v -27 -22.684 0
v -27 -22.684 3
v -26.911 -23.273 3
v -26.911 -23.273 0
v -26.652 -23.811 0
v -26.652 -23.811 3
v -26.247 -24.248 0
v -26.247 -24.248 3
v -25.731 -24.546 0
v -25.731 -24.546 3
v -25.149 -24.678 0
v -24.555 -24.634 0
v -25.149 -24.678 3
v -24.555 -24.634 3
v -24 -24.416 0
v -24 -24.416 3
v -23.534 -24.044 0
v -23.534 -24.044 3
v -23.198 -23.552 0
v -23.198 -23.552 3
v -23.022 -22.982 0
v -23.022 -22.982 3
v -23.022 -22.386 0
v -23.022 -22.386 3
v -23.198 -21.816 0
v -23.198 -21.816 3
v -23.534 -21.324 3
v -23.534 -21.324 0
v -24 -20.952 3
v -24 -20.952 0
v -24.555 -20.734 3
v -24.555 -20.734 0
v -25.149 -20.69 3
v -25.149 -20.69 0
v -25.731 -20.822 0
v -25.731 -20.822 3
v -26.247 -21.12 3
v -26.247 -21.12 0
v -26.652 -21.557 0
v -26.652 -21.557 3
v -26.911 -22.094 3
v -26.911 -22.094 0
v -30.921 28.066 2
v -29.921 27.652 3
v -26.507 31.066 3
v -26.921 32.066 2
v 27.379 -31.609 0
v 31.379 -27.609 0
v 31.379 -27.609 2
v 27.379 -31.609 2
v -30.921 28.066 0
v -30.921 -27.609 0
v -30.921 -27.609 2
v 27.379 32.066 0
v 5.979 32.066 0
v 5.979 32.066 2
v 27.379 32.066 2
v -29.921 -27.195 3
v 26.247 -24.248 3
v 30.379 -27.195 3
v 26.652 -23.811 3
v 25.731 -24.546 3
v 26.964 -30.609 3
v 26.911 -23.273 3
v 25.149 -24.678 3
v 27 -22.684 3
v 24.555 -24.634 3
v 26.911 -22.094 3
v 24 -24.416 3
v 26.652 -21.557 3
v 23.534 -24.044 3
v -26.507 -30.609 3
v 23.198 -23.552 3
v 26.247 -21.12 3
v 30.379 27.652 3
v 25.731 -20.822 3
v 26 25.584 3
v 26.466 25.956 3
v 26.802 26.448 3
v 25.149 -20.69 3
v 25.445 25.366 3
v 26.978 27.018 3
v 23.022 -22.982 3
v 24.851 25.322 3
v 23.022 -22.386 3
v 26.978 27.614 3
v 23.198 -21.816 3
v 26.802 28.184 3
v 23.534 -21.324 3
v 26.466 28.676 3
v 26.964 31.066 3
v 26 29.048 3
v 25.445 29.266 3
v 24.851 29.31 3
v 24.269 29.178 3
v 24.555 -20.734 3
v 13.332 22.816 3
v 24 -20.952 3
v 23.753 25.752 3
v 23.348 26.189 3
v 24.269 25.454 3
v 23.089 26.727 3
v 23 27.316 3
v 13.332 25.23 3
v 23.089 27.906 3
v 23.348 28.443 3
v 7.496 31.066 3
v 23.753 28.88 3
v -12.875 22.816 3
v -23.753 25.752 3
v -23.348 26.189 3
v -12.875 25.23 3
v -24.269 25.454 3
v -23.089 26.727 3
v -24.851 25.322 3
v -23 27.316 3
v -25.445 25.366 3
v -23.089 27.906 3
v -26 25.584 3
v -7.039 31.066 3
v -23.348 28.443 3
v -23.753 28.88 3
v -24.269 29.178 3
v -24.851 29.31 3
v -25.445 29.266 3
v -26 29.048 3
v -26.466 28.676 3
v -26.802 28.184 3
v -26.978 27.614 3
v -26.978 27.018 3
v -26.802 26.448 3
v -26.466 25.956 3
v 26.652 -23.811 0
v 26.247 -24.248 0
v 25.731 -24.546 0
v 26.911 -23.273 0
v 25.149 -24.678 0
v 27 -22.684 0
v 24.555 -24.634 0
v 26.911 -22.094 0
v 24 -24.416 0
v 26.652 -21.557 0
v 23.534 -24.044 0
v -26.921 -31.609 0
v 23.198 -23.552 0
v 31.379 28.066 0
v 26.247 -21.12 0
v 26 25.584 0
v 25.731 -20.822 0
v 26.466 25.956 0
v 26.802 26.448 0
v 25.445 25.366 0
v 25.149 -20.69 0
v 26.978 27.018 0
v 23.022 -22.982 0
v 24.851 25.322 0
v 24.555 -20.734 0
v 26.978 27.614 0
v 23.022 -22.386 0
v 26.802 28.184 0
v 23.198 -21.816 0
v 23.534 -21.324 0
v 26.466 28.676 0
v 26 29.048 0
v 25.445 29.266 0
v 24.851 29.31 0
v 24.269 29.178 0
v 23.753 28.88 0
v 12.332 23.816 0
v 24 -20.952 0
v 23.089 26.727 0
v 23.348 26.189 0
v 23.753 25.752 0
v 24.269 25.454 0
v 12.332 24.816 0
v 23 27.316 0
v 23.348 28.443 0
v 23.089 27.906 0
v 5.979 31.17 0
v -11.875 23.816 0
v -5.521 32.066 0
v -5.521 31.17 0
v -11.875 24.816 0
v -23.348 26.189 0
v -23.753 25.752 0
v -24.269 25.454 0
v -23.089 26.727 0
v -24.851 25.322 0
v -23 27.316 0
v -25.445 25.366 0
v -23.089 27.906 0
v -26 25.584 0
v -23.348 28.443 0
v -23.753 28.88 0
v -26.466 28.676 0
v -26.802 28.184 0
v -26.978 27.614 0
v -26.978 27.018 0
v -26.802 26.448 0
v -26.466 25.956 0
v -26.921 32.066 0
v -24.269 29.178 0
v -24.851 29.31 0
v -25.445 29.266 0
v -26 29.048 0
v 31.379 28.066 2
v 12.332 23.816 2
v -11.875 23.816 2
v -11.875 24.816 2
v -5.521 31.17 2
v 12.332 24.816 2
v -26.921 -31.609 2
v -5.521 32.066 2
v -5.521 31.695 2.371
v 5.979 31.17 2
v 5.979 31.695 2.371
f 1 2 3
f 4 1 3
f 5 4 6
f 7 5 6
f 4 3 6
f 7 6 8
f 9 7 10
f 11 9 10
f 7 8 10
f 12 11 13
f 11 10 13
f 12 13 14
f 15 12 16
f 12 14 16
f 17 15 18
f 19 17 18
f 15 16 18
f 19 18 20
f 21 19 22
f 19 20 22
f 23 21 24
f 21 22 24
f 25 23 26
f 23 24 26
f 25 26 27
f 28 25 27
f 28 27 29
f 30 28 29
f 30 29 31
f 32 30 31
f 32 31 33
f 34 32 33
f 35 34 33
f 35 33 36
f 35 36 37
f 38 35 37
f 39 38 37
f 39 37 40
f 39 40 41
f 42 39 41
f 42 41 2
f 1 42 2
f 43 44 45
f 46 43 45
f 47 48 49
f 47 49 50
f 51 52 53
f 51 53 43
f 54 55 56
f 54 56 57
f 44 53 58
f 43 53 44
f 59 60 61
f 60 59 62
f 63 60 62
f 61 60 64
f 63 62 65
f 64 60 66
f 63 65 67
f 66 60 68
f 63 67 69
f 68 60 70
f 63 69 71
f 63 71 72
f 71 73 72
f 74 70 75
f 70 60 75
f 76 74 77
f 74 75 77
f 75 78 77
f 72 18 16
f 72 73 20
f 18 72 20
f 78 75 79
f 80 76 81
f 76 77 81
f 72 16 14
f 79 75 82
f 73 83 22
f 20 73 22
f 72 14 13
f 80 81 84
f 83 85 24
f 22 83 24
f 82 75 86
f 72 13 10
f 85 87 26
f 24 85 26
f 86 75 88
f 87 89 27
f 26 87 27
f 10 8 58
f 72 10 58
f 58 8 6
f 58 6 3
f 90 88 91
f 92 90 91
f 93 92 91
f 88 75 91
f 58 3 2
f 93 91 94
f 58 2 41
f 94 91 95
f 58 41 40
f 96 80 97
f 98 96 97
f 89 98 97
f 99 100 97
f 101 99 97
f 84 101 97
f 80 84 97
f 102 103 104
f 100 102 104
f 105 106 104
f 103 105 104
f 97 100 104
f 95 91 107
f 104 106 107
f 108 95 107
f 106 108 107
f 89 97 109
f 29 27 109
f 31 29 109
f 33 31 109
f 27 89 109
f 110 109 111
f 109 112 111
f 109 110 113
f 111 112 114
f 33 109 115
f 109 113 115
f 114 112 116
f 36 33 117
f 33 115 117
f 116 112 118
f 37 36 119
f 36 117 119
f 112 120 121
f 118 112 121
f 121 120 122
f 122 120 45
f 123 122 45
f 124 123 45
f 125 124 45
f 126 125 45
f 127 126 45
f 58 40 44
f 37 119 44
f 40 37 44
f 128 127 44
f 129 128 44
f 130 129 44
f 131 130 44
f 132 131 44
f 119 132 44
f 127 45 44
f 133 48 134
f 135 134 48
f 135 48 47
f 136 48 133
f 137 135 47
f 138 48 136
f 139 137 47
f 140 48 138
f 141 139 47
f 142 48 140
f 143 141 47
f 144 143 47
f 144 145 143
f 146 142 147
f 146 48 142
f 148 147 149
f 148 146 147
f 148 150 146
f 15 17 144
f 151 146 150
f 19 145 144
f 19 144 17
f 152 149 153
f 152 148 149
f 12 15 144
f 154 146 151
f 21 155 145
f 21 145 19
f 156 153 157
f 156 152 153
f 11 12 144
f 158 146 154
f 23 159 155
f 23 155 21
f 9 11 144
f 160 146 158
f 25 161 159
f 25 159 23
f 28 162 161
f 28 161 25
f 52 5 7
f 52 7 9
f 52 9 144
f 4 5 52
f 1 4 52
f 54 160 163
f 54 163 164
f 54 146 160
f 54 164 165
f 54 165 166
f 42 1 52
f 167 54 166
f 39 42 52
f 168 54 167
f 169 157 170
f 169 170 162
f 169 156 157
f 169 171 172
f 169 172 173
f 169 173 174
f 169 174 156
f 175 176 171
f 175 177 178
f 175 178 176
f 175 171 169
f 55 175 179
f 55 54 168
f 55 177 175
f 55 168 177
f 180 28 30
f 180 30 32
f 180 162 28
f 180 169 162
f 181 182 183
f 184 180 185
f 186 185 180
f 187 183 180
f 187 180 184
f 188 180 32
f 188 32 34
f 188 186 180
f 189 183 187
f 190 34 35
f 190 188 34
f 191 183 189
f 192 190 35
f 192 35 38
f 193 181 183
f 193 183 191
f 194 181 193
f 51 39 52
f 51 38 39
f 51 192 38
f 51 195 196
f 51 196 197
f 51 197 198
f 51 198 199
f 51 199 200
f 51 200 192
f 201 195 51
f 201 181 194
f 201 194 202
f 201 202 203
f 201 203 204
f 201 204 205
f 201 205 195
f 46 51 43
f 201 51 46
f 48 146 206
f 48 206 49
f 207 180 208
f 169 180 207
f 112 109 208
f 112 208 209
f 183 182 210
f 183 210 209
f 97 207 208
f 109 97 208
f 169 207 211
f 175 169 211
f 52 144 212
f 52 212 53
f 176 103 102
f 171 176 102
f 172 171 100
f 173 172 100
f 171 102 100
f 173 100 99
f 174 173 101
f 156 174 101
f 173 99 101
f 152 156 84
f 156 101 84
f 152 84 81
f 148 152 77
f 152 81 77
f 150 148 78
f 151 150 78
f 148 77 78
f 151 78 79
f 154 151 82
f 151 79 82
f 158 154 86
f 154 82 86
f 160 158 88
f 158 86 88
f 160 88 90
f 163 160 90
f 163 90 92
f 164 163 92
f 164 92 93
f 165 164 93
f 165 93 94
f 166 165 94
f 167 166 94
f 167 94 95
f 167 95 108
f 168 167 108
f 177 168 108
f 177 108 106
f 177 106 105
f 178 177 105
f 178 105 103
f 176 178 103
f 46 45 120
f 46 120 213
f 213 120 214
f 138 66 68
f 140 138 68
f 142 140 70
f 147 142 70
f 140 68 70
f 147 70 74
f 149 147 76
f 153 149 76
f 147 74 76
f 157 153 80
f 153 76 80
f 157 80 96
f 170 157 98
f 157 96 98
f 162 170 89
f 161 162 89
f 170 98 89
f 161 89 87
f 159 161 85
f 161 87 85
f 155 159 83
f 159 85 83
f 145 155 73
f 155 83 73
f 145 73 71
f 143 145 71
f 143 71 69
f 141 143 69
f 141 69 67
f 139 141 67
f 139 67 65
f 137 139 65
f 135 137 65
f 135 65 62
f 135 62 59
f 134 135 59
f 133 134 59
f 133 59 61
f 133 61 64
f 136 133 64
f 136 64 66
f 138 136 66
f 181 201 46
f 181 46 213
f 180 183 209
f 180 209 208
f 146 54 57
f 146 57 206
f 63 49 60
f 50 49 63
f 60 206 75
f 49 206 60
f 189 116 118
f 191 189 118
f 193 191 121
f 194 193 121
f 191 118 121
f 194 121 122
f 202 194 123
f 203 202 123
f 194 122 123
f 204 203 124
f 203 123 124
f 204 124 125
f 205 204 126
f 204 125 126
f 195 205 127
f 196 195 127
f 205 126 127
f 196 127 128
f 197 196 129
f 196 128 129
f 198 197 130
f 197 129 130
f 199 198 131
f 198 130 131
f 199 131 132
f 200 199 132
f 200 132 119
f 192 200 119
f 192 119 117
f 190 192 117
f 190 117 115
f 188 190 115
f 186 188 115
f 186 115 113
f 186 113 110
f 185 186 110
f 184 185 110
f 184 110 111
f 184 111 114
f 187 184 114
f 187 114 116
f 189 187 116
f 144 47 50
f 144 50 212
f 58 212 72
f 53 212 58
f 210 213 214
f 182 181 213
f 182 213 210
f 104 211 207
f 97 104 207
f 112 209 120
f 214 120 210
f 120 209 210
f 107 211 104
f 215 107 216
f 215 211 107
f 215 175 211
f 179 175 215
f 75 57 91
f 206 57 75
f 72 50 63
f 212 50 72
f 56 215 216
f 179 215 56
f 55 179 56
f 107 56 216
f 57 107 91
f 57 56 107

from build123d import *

# Parameters (mm, degrees)
BOSS_EXTRUDE1_DEPTH = 3
CUT_EXTRUDE4_DEPTH  = 10
CHAMFER1_SIZE       = 1
SKETCH4_R           = 2
CUT_EXTRUDE5_DEPTH  = 10


with BuildPart() as part:
    # Sketch3 → Boss-Extrude1 (new body)
    with BuildSketch(Plane.XY):
        Polygon((-26.921356186, 32.06604295), (27.378643814, 32.06604295), (31.378643814, 28.06604295), (31.378643814, -27.608755321), (27.378643814, -31.608755321), (-26.921356186, -31.608755321), (-30.921356186, -27.608755321), (-30.921356186, 28.06604295), align=None)
    extrude(amount=BOSS_EXTRUDE1_DEPTH)

    # Sketch2 → Cut-Extrude4 (cut)
    with BuildSketch(Plane.XY):
        Polygon((-11.874909576, 24.81604295), (-11.874909576, 23.81604295), (12.332197205, 23.81604295), (12.332197205, 24.81604295), (5.978643814, 31.16959634), (5.978643814, 32.31604295), (-5.521356186, 32.31604295), (-5.521356186, 31.16959634), align=None)
    extrude(amount=CUT_EXTRUDE4_DEPTH, mode=Mode.SUBTRACT)

    # Chamfer1
    chamfer1_edges = [part.edges().sort_by_distance(p)[0] for p in [
        (-16.221356186, 32.06604295, 3),
    ]]
    chamfer(chamfer1_edges, length=CHAMFER1_SIZE)
    chamfer1_2_edges = [part.edges().sort_by_distance(p)[0] for p in [
        (-29.421356186, 29.56604295, 3),
    ]]
    chamfer(chamfer1_2_edges, length=CHAMFER1_SIZE)
    chamfer1_3_edges = [part.edges().sort_by_distance(p)[0] for p in [
        (-30.921356186, -0.478462967, 3),
    ]]
    chamfer(chamfer1_3_edges, length=CHAMFER1_SIZE)
    chamfer1_4_edges = [part.edges().sort_by_distance(p)[0] for p in [
        (-28.421356186, -30.108755321, 3),
    ]]
    chamfer(chamfer1_4_edges, length=CHAMFER1_SIZE)
    chamfer1_5_edges = [part.edges().sort_by_distance(p)[0] for p in [
        (0.935750595, -31.608755321, 3),
    ]]
    chamfer(chamfer1_5_edges, length=CHAMFER1_SIZE)
    chamfer1_6_edges = [part.edges().sort_by_distance(p)[0] for p in [
        (29.878643814, -29.108755321, 3),
    ]]
    chamfer(chamfer1_6_edges, length=CHAMFER1_SIZE)
    chamfer1_7_edges = [part.edges().sort_by_distance(p)[0] for p in [
        (31.378643814, 0.935750595, 3),
    ]]
    chamfer(chamfer1_7_edges, length=CHAMFER1_SIZE)
    chamfer1_8_edges = [part.edges().sort_by_distance(p)[0] for p in [
        (28.878643814, 30.56604295, 3),
    ]]
    chamfer(chamfer1_8_edges, length=CHAMFER1_SIZE)
    chamfer1_9_edges = [part.edges().sort_by_distance(p)[0] for p in [
        (15.971537033, 32.06604295, 3),
    ]]
    chamfer(chamfer1_9_edges, length=CHAMFER1_SIZE)
    chamfer1_10_edges = [part.edges().sort_by_distance(p)[0] for p in [
        (9.207197205, 27.94104295, 3),
    ]]
    chamfer(chamfer1_10_edges, length=CHAMFER1_SIZE)
    chamfer1_11_edges = [part.edges().sort_by_distance(p)[0] for p in [
        (12.332197205, 24.31604295, 3),
    ]]
    chamfer(chamfer1_11_edges, length=CHAMFER1_SIZE)
    chamfer1_12_edges = [part.edges().sort_by_distance(p)[0] for p in [
        (0.228643814, 23.81604295, 3),
    ]]
    chamfer(chamfer1_12_edges, length=CHAMFER1_SIZE)
    chamfer1_13_edges = [part.edges().sort_by_distance(p)[0] for p in [
        (-11.874909576, 24.31604295, 3),
    ]]
    chamfer(chamfer1_13_edges, length=CHAMFER1_SIZE)
    chamfer1_14_edges = [part.edges().sort_by_distance(p)[0] for p in [
        (-8.749909576, 27.94104295, 3),
    ]]
    chamfer(chamfer1_14_edges, length=CHAMFER1_SIZE)

    # Sketch4 → Cut-Extrude5 (cut)
    with BuildSketch(Plane.XY.offset(3)):
        with Locations((-25, 27.31604295)):
            Circle(SKETCH4_R)
        with Locations(Location((25, 27.31604295, 0), (0, 0, 180))):
            Circle(SKETCH4_R)
        with Locations((25, -22.68395705)):
            Circle(SKETCH4_R)
        with Locations(Location((-25, -22.68395705, 0), (0, 0, 180))):
            Circle(SKETCH4_R)
    extrude(amount=-CUT_EXTRUDE5_DEPTH, mode=Mode.SUBTRACT)


solid = part.part
